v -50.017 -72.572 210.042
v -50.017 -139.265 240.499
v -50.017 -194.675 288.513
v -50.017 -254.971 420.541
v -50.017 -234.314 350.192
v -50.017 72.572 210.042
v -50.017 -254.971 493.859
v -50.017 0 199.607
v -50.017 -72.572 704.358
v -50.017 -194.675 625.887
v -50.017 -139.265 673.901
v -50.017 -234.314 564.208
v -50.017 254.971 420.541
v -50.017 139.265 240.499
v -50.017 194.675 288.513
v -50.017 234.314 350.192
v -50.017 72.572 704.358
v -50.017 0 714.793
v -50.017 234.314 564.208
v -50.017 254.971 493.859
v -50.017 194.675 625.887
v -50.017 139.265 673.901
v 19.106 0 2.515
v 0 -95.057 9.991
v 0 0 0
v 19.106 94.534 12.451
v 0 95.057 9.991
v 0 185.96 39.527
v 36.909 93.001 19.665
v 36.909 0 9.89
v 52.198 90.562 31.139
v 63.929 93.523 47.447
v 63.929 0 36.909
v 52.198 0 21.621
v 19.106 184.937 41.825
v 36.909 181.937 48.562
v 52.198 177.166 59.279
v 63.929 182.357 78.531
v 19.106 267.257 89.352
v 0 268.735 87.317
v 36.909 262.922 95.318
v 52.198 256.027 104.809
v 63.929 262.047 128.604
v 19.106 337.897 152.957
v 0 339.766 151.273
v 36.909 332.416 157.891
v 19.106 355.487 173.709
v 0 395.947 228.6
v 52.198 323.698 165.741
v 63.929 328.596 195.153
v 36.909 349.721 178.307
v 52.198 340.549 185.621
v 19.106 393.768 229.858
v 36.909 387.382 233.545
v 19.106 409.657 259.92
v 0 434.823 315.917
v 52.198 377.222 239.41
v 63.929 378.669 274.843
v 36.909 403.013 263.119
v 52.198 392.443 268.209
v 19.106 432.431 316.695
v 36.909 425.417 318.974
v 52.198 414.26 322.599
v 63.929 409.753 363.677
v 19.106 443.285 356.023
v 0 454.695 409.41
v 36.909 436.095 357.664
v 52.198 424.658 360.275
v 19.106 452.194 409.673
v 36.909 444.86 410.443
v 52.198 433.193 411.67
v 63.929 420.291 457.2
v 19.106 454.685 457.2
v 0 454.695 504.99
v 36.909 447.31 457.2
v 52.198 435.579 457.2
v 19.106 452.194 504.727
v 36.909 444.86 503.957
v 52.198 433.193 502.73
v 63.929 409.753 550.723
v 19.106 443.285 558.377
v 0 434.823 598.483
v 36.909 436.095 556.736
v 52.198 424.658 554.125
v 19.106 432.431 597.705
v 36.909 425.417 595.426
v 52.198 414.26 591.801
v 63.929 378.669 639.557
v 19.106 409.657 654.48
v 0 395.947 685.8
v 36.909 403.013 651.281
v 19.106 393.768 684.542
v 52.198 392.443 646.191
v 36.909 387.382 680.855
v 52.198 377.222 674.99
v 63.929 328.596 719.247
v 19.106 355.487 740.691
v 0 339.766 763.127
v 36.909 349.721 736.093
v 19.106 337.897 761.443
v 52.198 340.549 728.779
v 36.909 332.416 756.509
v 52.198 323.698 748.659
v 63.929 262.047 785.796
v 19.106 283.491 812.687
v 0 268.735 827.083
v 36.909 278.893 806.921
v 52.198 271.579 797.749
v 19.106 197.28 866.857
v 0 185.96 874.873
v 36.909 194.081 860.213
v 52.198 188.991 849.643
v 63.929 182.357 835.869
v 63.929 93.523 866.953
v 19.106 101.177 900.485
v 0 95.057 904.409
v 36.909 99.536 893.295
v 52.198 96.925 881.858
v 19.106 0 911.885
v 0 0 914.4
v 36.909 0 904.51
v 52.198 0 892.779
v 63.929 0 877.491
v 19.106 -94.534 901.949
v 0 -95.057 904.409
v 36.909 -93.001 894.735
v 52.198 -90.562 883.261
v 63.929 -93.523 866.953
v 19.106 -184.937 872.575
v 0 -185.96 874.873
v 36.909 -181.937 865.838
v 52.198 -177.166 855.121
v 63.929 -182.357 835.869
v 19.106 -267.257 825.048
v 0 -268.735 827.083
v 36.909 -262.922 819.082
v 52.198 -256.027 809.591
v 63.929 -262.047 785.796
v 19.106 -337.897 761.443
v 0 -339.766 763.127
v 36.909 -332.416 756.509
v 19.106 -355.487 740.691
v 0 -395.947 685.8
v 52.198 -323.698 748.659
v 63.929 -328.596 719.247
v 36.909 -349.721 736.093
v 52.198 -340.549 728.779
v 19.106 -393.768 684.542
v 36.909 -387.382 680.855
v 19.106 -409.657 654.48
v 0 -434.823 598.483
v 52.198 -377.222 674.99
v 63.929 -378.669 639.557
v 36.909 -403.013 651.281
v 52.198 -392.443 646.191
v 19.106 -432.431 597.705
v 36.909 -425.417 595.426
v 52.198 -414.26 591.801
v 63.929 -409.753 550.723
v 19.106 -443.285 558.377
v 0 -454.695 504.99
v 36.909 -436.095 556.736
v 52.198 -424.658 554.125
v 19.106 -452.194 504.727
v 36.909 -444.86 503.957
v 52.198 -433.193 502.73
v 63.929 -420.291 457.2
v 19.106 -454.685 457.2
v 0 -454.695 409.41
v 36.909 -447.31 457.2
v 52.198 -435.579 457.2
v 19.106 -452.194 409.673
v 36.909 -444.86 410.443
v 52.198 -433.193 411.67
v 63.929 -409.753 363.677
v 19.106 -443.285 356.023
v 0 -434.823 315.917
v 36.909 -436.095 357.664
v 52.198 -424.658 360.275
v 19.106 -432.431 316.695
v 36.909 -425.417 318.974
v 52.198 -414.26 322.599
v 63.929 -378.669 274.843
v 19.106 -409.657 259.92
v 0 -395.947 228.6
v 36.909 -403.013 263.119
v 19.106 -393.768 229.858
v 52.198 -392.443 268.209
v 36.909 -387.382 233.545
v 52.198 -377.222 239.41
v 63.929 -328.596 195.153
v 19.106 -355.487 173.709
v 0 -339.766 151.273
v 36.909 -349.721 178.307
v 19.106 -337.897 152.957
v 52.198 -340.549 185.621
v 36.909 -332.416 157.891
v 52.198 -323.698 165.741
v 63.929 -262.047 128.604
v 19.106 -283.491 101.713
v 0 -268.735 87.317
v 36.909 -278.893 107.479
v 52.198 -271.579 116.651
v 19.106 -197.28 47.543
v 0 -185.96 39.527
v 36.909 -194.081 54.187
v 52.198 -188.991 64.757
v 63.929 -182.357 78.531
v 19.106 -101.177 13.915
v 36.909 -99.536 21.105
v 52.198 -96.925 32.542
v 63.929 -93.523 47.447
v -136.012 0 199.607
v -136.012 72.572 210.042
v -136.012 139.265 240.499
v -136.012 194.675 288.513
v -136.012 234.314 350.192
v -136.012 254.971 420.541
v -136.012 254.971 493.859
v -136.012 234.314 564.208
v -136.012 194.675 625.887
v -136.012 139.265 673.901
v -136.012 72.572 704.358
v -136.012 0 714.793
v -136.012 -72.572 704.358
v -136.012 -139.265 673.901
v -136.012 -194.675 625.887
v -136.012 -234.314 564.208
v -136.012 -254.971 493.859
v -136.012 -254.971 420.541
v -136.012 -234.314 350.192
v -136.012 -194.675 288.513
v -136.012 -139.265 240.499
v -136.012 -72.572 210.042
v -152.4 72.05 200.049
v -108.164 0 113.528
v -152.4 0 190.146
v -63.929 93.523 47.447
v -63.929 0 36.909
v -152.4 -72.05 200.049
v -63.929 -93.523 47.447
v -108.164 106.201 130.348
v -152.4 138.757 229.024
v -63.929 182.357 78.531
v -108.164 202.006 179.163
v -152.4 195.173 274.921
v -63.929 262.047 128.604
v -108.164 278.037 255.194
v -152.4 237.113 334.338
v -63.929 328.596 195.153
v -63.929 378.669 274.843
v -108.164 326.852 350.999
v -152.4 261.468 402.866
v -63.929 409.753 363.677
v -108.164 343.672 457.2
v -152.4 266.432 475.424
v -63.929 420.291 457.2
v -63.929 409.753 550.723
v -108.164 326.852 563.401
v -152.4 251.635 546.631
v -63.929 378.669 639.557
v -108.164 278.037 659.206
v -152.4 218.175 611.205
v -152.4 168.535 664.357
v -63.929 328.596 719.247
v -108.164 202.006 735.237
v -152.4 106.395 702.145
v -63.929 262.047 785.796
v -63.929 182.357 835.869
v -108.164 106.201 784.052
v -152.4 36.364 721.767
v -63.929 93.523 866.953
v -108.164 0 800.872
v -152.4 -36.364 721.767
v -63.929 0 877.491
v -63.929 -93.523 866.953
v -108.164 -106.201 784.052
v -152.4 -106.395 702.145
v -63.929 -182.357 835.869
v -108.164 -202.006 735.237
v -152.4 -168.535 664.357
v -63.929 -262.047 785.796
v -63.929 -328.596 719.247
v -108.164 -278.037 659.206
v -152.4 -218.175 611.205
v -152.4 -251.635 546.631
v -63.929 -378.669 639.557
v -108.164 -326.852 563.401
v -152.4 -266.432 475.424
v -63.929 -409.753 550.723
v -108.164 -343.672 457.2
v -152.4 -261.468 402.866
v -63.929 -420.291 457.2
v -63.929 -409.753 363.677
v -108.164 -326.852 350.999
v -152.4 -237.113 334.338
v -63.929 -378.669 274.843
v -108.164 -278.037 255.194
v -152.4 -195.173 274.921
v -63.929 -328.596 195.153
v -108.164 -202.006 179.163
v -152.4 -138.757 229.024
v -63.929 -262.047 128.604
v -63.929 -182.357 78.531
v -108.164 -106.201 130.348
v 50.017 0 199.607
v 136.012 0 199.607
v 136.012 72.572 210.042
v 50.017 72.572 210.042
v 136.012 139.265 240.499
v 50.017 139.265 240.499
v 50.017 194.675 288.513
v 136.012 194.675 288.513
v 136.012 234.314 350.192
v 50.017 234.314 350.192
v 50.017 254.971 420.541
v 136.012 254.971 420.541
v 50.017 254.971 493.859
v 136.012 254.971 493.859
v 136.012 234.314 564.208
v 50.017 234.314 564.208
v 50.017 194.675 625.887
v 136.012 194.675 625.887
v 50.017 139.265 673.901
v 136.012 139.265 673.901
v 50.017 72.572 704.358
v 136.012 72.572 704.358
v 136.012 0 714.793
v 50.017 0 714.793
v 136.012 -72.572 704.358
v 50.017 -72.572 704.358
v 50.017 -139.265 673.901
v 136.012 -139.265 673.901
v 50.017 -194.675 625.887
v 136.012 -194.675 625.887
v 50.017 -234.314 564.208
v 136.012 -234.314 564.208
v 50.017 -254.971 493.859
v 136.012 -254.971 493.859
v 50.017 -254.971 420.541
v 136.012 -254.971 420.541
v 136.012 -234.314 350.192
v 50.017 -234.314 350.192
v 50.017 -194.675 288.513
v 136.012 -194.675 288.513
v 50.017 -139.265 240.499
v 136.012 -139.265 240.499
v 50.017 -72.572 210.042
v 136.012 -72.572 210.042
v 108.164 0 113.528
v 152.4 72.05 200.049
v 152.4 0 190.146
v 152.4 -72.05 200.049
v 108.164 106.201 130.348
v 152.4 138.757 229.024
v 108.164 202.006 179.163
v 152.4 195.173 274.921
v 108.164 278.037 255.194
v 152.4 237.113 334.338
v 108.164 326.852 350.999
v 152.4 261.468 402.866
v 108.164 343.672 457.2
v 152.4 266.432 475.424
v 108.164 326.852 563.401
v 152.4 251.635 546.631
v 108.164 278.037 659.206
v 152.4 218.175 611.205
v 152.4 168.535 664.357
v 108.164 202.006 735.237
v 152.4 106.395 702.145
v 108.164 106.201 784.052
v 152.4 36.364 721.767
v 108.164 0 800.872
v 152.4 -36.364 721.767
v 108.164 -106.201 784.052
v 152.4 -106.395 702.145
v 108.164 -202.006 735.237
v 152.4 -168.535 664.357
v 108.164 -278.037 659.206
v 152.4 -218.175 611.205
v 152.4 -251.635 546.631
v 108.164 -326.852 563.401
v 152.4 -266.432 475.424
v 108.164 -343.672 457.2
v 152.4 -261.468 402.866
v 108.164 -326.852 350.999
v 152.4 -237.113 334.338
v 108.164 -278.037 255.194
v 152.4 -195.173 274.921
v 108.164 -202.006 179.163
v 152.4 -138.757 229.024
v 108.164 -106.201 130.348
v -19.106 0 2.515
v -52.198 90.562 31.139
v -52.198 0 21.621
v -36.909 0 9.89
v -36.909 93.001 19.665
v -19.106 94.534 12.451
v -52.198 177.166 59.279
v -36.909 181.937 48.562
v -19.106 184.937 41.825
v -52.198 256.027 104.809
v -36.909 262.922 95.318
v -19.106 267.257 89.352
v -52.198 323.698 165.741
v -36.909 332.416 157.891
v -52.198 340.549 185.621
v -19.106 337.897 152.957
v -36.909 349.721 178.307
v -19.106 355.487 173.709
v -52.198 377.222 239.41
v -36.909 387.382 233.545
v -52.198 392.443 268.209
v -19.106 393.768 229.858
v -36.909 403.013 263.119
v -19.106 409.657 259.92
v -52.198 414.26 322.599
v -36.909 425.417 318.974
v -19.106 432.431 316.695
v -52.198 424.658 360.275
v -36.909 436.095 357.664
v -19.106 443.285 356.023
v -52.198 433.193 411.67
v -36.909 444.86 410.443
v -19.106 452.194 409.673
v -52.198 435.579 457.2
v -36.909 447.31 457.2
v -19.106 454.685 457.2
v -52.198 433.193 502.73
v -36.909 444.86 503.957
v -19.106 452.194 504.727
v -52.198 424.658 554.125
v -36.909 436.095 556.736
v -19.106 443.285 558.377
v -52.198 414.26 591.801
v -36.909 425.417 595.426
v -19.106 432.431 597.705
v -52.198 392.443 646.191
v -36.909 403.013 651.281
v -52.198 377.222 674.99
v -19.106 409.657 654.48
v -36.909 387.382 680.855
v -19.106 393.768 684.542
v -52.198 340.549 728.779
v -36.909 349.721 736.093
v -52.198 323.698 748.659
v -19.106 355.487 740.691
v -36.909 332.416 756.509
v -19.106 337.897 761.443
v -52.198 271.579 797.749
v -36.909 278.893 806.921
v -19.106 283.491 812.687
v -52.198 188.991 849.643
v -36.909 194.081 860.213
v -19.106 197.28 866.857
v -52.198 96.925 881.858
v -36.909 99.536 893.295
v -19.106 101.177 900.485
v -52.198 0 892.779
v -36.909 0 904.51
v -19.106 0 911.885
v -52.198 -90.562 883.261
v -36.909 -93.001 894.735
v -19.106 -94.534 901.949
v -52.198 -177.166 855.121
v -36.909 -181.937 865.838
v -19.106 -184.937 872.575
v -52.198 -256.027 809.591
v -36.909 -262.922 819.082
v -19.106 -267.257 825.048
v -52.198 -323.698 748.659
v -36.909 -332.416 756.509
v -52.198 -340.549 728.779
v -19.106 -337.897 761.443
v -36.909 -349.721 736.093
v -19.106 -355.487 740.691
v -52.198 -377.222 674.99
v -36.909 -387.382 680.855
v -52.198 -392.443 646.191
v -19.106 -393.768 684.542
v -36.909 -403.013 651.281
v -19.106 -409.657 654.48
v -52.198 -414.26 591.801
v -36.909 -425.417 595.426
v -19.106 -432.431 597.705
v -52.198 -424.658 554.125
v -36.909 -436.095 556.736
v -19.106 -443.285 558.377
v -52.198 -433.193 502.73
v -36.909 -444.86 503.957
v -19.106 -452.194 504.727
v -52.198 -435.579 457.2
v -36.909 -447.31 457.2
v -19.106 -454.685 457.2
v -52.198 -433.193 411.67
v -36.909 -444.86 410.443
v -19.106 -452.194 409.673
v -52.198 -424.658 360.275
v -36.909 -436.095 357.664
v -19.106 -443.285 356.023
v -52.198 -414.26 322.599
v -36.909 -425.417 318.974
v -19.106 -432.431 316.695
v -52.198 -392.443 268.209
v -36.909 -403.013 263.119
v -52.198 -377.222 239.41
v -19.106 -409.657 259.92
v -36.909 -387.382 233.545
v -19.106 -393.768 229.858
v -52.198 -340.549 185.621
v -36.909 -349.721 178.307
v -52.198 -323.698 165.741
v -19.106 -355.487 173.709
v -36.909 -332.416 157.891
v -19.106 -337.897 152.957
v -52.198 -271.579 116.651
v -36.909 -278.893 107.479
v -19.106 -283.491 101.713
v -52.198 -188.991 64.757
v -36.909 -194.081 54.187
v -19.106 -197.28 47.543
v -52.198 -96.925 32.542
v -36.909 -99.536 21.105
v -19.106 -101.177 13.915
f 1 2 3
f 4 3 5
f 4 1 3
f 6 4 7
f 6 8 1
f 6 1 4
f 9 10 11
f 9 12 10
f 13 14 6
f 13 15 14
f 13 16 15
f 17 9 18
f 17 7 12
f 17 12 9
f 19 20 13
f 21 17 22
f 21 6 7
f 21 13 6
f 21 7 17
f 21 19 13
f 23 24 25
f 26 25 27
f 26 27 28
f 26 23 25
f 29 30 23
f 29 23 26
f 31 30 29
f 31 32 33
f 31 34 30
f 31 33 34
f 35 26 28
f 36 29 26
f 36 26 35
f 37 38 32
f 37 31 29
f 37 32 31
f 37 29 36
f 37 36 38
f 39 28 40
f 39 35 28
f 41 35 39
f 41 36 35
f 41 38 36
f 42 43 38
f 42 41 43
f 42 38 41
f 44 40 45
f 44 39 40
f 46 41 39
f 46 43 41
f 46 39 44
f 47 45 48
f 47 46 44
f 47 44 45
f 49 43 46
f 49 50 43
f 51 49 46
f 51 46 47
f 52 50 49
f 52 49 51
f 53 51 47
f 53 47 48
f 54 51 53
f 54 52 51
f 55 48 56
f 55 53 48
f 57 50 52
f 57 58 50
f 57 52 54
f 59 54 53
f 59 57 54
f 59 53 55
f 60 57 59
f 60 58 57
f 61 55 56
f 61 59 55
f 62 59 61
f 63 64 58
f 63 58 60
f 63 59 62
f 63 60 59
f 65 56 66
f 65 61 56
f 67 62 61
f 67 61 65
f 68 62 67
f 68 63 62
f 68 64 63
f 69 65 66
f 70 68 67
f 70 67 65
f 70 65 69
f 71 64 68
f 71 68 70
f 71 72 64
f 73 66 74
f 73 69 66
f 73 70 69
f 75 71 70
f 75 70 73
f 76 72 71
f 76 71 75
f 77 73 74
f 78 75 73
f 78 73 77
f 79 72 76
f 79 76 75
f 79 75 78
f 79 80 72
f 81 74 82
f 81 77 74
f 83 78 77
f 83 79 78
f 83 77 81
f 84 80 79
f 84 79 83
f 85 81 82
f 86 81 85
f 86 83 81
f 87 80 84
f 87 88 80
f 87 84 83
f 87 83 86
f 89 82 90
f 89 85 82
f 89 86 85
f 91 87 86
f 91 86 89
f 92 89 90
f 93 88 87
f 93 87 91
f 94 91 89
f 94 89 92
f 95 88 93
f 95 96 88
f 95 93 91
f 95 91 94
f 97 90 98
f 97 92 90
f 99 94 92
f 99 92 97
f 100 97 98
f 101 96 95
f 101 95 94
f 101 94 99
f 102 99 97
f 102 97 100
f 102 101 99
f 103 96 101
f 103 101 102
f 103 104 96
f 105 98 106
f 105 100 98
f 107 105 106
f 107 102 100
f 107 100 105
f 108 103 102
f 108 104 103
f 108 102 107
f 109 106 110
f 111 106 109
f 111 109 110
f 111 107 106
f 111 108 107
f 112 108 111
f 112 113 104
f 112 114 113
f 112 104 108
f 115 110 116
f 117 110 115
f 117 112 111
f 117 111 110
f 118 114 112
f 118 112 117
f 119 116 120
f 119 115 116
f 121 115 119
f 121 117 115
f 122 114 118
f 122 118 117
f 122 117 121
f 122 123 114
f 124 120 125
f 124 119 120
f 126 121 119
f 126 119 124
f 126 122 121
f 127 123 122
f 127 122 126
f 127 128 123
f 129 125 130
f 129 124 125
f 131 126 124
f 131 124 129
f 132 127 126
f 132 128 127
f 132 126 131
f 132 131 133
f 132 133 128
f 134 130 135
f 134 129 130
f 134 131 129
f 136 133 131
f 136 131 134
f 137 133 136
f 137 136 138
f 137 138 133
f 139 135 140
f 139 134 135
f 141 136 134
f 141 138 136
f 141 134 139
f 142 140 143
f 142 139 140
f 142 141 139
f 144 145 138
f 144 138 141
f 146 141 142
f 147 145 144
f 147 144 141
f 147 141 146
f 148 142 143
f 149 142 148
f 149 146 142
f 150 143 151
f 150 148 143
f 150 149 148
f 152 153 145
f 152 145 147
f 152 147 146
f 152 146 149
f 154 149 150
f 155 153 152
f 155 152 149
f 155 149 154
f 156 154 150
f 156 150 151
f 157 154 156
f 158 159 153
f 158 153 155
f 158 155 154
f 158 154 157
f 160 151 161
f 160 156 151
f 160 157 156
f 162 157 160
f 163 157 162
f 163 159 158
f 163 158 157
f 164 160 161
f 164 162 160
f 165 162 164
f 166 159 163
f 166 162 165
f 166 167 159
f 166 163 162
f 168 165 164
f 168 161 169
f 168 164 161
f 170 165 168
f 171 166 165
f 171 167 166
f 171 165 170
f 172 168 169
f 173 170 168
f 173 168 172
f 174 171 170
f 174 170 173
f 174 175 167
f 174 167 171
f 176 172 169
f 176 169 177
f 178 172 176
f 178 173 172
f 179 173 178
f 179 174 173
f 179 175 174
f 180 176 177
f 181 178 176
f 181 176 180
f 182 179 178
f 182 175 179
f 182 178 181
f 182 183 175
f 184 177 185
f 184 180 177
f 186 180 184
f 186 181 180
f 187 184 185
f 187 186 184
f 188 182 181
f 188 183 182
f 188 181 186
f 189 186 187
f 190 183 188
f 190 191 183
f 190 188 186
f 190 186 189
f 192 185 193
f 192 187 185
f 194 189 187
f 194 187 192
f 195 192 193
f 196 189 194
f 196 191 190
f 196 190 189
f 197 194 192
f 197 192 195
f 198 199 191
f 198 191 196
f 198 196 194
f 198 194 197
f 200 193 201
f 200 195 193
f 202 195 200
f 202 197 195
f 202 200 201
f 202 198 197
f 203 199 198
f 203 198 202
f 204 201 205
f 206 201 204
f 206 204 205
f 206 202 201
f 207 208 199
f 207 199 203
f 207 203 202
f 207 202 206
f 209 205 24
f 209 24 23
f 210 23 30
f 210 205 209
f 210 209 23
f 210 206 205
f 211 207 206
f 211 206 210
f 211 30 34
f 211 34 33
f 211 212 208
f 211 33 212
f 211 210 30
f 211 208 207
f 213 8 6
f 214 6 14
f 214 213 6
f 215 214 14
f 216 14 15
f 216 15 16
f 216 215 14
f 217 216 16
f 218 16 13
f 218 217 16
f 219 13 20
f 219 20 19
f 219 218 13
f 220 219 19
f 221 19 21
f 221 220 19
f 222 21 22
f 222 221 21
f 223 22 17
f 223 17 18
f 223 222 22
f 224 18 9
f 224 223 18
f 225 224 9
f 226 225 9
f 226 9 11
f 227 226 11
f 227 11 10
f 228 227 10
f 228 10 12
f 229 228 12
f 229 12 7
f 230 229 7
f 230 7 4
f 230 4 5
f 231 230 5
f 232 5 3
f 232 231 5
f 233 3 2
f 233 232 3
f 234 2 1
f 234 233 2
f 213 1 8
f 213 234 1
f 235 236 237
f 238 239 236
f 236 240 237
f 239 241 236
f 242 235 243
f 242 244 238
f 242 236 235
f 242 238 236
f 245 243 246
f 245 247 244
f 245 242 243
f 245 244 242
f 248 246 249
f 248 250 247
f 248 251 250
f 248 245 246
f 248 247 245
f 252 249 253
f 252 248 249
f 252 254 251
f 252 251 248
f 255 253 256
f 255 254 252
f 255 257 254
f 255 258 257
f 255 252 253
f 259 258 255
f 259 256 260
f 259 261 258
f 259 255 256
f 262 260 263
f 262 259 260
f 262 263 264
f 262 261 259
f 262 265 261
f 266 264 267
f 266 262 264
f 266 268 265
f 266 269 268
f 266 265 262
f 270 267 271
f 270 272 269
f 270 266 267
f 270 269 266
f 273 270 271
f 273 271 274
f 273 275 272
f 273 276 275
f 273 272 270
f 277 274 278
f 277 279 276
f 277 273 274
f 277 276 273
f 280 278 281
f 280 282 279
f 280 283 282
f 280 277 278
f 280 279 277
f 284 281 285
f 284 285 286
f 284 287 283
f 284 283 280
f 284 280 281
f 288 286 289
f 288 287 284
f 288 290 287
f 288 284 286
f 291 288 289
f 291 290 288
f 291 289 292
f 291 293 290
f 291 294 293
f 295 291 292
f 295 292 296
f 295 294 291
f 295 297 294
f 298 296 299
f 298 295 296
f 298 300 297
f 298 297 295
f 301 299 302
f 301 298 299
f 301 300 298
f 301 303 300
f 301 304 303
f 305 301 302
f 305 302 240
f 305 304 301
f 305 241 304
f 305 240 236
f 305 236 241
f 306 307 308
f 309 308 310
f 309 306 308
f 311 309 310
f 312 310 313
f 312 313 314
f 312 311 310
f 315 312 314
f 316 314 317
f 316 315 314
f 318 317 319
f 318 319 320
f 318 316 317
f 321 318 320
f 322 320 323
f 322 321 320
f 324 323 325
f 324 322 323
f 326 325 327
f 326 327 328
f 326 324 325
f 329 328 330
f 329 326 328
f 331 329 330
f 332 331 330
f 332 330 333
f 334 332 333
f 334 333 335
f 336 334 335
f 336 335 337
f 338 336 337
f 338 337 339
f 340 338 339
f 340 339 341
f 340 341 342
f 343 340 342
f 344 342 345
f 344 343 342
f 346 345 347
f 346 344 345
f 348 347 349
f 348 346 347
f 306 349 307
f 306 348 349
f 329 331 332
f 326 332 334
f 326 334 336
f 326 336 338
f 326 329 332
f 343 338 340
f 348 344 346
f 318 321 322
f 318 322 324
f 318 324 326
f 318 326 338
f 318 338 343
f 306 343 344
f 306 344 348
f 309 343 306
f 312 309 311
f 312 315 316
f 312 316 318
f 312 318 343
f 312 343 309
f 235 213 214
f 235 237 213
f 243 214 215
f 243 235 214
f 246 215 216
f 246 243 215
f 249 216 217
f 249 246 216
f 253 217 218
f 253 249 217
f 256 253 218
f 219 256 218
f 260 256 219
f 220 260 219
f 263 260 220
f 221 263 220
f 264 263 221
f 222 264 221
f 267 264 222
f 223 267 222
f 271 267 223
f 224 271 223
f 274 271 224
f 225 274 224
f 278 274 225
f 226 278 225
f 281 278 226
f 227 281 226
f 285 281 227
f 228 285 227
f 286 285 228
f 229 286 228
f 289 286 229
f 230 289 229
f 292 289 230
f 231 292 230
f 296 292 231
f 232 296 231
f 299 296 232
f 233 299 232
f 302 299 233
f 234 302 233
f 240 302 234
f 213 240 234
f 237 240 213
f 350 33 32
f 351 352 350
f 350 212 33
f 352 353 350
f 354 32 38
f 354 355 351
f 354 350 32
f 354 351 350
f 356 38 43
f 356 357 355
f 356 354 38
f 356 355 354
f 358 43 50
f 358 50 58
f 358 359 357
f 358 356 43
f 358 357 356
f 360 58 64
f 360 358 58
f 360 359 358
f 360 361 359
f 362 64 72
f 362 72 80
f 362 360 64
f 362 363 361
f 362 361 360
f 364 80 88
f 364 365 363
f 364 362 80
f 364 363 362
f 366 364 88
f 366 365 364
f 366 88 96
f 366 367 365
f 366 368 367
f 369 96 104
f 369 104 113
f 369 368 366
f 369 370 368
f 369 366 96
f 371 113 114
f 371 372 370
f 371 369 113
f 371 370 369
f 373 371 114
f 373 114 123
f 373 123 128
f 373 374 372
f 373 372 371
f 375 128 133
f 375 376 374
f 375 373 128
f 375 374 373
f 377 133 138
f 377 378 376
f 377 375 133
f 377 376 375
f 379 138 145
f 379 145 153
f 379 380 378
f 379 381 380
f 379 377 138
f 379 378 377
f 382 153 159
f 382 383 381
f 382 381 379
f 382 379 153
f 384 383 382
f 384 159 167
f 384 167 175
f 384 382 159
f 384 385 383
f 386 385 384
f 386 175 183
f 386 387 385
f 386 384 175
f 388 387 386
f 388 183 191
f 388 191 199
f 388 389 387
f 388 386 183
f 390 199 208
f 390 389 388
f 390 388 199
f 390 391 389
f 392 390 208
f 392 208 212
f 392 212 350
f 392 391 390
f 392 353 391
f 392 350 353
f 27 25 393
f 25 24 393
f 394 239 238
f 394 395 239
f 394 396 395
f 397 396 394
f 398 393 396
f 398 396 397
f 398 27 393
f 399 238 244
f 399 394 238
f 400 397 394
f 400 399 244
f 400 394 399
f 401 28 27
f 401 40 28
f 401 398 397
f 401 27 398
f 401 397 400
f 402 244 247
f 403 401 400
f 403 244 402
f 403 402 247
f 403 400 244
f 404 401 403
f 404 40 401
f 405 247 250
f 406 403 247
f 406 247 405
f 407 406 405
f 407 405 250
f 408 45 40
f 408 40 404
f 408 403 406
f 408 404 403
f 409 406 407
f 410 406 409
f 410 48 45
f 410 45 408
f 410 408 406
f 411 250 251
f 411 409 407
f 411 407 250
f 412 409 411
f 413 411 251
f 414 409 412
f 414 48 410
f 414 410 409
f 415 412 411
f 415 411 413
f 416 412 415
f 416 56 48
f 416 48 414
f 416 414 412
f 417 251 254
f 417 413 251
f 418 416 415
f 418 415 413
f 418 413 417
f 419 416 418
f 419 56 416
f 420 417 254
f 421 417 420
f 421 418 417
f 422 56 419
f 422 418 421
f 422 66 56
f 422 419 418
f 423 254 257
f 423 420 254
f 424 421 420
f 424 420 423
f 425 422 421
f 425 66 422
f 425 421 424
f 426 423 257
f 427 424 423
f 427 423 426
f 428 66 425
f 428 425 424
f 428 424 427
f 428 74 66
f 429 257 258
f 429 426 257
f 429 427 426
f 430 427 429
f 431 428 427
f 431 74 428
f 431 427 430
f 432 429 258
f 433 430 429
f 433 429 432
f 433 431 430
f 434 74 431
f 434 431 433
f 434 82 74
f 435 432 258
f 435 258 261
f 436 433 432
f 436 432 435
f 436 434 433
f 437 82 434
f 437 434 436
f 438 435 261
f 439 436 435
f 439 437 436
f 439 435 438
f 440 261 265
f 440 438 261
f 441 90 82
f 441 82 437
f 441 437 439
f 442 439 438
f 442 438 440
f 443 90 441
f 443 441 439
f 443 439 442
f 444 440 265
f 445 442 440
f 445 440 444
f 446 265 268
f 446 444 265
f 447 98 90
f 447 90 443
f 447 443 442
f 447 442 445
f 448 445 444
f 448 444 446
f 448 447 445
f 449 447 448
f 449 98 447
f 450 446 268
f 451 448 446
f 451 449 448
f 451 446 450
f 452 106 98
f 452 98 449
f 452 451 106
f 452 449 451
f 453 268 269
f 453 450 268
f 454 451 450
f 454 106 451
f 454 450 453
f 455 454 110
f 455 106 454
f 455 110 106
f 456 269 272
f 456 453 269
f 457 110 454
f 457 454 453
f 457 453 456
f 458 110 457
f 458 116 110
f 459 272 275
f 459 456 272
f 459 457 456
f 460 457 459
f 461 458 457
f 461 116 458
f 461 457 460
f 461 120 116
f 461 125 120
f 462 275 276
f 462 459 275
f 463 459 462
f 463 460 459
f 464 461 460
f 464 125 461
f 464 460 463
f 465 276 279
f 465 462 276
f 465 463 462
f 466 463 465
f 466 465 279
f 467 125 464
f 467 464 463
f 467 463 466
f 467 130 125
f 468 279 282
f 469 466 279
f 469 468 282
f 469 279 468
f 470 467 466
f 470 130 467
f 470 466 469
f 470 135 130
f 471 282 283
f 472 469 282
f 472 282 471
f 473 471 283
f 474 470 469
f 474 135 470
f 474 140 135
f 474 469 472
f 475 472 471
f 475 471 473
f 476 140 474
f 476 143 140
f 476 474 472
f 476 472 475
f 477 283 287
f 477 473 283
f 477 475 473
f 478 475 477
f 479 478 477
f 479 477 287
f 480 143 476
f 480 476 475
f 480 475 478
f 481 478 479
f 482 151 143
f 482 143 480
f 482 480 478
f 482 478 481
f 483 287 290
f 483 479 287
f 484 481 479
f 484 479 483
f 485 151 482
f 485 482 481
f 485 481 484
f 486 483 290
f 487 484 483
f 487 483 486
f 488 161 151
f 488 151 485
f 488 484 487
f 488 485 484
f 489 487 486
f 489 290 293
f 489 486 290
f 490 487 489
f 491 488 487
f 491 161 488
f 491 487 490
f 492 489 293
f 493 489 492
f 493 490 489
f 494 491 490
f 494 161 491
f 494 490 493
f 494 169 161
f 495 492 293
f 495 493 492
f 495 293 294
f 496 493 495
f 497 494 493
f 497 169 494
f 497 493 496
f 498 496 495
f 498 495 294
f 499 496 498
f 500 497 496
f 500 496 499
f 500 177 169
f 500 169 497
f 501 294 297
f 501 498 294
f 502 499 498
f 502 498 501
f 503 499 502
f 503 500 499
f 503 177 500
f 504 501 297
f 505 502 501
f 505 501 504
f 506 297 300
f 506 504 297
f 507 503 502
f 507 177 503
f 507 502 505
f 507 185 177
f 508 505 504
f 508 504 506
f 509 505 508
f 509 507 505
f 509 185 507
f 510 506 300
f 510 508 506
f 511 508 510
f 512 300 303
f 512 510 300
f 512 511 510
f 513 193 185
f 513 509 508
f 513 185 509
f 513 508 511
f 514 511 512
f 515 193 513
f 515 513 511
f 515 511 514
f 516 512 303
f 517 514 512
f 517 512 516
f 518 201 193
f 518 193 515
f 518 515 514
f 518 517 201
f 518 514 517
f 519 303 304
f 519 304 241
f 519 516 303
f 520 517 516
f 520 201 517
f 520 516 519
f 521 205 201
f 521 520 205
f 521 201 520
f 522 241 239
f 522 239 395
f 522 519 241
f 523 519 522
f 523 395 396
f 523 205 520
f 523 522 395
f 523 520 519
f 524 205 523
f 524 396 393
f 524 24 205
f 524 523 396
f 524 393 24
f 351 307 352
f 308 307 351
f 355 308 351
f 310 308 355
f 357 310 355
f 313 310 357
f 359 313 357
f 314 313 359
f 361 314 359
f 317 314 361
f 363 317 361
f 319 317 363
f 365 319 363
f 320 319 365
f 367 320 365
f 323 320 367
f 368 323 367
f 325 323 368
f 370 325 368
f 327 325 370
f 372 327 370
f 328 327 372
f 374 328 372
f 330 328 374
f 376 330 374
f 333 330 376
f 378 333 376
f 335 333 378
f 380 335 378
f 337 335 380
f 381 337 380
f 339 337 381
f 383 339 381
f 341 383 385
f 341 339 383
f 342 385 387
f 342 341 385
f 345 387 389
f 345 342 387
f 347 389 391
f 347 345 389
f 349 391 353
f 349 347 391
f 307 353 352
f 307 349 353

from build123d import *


with BuildPart() as f1:
    # F0 (on Front) → F1 (revolve)
    with BuildSketch(Plane.XZ):
        with BuildLine():
            ThreePointArc((-63.928831, 36.909328), (-36.909328, 9.889825), (0, 0))
            ThreePointArc((0, 0), (36.909328, 9.889825), (63.928831, 36.909328))
            Line((63.928831, 36.909328), (152.4, 190.145887))
            Line((152.4, 190.145887), (136.012062, 199.607468))
            Line((136.012062, 199.607468), (50.016642, 199.607468))
            Line((50.016642, 199.607468), (50.016642, 457.2))
            Line((50.016642, 457.2), (0, 457.2))
            Line((0, 457.2), (-50.016642, 457.2))
            Line((-50.016642, 457.2), (-50.016642, 199.607468))
            Line((-50.016642, 199.607468), (-136.012062, 199.607468))
            Line((-136.012062, 199.607468), (-152.4, 190.145887))
            Line((-152.4, 190.145887), (-63.928831, 36.909328))
        make_face()
    revolve(axis=Axis((25.008321, 0, 457.2), (1, 0, 0)))


solid = f1.part
